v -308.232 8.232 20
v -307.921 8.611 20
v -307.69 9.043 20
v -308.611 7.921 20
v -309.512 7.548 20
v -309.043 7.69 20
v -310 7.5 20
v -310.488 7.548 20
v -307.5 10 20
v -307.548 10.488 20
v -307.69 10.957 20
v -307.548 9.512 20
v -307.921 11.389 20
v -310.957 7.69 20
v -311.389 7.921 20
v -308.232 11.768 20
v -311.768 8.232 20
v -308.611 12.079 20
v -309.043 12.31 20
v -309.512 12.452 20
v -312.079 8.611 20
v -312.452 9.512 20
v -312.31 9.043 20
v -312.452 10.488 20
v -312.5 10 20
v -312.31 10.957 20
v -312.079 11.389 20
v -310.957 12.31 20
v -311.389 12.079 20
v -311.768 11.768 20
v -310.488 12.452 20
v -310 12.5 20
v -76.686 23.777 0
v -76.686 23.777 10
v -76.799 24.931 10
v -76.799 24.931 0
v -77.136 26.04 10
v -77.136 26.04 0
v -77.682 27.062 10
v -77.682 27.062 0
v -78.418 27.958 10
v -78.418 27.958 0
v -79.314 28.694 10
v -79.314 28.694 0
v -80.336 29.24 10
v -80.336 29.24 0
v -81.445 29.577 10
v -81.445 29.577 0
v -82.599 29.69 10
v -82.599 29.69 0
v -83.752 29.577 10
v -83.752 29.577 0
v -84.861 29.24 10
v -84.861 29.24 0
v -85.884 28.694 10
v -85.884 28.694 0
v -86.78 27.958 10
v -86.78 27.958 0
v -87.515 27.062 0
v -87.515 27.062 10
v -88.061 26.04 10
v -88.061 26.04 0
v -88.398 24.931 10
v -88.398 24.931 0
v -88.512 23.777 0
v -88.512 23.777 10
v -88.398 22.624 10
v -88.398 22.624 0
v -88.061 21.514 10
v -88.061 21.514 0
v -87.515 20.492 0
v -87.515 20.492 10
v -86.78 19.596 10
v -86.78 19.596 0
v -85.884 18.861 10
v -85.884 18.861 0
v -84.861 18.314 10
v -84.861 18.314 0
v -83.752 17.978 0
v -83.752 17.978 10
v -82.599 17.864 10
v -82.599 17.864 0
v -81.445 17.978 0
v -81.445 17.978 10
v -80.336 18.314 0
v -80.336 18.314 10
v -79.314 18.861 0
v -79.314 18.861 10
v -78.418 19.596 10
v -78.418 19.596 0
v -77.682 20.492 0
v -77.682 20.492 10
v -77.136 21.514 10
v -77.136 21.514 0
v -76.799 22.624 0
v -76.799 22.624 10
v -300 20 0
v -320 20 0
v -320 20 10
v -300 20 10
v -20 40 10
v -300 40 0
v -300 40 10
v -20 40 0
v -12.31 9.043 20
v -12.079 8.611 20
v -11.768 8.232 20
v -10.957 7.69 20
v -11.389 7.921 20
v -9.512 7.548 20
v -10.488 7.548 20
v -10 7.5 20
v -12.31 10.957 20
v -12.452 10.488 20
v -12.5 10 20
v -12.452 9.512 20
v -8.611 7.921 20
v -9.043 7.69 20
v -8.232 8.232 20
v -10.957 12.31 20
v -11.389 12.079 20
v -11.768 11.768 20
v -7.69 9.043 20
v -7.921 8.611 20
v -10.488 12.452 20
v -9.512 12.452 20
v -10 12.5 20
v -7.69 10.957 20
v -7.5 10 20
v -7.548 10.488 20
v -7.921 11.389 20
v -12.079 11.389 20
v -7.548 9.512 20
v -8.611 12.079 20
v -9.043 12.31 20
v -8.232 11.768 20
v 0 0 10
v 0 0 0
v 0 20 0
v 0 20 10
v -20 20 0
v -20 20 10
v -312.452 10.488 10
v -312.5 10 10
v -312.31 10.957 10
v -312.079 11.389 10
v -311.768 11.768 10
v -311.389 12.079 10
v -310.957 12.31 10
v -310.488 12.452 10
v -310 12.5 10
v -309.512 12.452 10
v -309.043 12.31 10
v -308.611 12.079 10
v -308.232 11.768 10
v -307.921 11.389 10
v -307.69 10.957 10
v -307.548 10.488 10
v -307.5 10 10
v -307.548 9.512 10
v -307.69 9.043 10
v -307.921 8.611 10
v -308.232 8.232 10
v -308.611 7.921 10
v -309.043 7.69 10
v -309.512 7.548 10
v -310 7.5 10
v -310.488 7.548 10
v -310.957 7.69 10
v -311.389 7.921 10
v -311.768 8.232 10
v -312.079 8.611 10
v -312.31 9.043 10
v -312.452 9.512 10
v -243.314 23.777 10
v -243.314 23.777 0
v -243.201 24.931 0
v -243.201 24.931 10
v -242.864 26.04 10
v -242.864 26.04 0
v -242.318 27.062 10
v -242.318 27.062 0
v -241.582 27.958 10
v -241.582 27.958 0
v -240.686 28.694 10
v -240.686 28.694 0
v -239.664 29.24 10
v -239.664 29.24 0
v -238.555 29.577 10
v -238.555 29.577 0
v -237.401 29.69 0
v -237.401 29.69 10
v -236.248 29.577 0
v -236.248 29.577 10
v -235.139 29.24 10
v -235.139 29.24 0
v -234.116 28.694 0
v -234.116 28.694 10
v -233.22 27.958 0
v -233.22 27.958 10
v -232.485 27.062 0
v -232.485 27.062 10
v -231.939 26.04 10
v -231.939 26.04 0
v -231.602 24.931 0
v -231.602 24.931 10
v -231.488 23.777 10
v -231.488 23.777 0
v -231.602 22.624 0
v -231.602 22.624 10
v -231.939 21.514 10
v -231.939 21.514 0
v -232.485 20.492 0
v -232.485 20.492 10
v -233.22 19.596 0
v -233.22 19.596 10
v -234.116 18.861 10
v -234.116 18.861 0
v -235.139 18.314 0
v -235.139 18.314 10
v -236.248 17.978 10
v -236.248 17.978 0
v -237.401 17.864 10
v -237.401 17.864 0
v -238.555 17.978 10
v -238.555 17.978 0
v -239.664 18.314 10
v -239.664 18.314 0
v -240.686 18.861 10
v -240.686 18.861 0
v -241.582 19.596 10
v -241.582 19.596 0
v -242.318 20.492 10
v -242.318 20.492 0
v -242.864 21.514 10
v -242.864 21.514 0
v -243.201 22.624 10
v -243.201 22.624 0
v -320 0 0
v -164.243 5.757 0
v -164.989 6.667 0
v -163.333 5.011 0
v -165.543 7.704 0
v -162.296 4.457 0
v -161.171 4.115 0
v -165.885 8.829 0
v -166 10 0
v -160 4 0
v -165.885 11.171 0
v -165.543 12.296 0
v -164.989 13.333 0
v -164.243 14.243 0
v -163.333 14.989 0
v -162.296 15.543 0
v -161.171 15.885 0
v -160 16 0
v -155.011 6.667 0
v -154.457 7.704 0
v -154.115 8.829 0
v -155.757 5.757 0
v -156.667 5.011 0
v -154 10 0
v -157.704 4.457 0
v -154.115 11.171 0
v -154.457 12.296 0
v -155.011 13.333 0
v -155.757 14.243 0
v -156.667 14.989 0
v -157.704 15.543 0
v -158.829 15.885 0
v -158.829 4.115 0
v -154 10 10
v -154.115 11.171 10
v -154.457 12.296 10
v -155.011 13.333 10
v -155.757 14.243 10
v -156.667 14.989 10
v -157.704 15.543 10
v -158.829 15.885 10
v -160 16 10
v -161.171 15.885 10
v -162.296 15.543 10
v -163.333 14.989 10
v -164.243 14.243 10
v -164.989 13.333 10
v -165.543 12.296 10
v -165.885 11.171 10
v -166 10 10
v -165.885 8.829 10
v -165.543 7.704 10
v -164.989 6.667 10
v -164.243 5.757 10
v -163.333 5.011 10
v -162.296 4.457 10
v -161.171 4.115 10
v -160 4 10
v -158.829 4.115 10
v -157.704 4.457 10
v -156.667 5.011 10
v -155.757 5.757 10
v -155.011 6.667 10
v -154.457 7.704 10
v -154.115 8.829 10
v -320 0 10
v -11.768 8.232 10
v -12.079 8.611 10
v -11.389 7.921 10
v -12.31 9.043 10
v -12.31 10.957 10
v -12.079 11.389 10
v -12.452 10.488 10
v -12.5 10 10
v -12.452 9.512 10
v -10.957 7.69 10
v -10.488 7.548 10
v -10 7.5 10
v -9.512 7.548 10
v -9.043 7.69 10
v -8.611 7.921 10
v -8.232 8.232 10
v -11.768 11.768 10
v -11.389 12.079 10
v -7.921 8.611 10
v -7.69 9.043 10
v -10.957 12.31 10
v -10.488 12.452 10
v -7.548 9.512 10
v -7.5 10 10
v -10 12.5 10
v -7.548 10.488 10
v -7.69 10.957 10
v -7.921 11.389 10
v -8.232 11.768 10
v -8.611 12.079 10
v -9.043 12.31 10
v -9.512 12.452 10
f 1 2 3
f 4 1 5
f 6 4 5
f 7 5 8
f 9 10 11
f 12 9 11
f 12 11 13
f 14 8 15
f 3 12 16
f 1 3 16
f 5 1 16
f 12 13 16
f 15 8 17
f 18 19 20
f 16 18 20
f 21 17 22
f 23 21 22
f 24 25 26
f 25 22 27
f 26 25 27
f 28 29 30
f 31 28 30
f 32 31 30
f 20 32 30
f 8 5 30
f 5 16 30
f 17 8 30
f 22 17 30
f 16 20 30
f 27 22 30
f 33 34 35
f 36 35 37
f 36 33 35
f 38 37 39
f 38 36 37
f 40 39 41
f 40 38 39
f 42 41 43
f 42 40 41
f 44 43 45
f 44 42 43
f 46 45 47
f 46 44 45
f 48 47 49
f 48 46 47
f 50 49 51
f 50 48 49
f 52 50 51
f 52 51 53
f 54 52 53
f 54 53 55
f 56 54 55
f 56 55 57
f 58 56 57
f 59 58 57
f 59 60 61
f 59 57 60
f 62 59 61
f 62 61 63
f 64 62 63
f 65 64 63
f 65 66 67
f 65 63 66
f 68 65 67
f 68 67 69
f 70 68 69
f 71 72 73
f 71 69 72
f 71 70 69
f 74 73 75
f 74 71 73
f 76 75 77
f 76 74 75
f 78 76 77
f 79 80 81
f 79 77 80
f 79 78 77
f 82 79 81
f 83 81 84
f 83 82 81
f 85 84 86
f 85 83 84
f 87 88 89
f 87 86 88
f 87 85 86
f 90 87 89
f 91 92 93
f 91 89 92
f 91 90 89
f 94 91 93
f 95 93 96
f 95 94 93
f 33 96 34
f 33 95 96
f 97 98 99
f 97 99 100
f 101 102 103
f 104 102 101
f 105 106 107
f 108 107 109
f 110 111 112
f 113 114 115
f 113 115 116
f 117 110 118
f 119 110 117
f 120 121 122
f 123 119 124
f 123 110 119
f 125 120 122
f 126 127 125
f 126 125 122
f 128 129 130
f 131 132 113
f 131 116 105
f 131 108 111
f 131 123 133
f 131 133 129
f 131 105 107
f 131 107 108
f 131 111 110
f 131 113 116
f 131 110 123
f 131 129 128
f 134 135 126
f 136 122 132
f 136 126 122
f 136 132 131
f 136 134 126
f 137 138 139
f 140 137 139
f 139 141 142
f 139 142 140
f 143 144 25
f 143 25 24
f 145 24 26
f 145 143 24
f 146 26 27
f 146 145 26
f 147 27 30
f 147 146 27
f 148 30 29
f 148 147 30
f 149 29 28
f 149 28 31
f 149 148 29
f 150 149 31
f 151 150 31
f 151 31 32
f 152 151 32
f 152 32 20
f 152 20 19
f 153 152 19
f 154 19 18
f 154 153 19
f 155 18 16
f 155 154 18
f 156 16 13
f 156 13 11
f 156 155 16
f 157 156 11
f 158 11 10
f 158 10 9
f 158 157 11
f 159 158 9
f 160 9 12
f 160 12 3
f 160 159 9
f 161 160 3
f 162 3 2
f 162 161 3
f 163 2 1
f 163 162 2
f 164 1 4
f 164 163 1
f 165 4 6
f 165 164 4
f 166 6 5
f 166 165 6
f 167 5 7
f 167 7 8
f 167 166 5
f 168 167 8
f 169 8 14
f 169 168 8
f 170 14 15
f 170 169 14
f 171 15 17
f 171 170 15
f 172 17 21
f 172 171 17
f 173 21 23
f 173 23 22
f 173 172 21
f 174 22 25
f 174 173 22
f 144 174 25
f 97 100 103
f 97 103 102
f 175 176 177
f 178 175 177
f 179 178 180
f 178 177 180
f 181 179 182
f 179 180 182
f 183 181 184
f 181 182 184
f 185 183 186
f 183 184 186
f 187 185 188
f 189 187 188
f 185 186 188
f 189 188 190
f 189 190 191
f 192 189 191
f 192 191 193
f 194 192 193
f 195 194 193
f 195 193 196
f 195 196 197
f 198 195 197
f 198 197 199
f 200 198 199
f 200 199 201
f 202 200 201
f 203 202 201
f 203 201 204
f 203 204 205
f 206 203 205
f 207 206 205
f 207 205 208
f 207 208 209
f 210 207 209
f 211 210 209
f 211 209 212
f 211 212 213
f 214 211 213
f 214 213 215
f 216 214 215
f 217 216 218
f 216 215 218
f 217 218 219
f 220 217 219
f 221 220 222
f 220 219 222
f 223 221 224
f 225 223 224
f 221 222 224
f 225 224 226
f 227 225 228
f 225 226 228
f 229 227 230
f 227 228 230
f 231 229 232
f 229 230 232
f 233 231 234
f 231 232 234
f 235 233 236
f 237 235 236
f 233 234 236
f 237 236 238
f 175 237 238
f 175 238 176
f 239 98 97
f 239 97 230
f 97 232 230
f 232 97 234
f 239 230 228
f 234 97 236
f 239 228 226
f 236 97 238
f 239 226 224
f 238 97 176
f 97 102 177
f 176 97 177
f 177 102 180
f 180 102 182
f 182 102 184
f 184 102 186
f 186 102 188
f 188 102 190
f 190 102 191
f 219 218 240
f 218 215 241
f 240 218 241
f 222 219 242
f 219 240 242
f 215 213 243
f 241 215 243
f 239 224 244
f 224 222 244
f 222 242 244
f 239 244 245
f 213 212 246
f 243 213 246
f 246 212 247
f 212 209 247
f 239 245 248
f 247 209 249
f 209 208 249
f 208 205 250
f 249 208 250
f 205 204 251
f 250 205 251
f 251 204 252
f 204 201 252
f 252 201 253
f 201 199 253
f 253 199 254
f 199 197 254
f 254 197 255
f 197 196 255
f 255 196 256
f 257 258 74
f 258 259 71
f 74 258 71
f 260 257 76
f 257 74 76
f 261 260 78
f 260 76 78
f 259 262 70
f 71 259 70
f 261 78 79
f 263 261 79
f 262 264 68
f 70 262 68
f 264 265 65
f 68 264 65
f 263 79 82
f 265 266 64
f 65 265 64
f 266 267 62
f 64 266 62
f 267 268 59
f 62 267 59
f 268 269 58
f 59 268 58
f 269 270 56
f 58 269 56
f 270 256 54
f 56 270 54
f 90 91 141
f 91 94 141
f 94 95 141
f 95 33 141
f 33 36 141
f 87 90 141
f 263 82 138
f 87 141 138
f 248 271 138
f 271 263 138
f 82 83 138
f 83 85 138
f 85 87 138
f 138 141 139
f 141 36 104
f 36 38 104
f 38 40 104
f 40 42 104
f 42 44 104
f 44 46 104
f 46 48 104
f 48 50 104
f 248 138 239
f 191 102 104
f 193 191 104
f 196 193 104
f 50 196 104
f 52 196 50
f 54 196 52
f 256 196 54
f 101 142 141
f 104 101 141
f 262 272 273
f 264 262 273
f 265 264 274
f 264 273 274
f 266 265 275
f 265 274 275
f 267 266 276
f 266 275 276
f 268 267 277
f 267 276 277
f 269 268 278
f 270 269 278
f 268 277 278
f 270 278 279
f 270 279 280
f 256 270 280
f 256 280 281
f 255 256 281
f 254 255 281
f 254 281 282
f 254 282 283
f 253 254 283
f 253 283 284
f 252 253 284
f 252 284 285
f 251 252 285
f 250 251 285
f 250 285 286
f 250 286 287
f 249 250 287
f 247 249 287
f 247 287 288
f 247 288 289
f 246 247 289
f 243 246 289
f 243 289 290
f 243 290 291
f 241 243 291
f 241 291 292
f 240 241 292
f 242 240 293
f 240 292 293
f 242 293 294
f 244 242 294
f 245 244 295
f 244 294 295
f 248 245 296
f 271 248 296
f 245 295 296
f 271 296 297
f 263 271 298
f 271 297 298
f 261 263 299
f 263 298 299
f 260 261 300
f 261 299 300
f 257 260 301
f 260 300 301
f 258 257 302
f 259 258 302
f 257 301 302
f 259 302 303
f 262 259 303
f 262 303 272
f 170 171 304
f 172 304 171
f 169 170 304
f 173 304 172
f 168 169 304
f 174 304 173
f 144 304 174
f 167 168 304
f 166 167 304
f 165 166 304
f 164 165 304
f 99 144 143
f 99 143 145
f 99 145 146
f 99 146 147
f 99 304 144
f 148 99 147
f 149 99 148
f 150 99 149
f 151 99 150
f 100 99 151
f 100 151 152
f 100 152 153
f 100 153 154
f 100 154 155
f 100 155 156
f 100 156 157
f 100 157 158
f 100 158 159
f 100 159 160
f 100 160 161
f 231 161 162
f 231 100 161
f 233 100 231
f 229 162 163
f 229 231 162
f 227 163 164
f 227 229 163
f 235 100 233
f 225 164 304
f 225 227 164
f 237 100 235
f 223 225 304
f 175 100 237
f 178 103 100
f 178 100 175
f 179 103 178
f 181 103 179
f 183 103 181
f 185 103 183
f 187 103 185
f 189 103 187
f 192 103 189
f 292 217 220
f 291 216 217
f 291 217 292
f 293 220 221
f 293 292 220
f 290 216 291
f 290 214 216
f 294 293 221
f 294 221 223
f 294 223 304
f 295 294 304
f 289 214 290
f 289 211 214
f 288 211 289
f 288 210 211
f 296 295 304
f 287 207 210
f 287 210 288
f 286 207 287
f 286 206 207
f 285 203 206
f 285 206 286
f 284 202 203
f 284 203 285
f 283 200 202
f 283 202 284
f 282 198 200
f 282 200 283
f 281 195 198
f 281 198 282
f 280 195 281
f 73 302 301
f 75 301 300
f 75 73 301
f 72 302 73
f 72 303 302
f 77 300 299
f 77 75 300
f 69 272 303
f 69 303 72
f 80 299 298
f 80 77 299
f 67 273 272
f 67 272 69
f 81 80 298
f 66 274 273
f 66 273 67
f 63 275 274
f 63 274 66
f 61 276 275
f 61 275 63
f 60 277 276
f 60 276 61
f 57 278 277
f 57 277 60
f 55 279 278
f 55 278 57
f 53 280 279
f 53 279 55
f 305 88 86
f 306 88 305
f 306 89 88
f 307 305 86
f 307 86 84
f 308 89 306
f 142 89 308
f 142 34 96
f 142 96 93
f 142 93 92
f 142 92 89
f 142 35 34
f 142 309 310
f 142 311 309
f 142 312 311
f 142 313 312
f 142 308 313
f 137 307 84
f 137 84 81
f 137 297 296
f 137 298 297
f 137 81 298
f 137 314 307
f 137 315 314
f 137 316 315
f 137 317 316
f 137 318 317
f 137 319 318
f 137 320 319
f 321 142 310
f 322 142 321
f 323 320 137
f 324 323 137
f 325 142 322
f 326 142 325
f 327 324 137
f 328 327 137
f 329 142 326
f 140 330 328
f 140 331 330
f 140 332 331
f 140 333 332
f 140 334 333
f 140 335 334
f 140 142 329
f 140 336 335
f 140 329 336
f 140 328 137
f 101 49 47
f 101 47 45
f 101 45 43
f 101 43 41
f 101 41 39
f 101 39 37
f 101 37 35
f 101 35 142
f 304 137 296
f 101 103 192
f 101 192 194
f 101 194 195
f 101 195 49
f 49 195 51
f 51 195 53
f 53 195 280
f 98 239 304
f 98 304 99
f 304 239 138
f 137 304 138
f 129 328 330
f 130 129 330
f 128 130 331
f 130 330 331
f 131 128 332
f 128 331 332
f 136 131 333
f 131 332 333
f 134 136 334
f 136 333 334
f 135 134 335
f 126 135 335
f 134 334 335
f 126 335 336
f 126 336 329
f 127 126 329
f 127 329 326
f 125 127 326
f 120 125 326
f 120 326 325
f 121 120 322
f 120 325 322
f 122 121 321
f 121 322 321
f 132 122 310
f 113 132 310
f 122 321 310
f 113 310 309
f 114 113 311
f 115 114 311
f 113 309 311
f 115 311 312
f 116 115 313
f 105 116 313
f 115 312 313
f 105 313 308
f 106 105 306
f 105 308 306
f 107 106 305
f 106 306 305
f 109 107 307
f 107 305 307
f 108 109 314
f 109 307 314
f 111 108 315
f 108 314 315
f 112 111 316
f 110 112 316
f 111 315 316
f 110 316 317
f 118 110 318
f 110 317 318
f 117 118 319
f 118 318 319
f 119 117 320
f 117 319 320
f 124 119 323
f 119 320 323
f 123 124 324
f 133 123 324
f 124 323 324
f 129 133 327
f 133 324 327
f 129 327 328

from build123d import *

# Parameters (mm, degrees)
SKETCH1_W           = 320
SKETCH1_H           = 20
BOSS_EXTRUDE1_DEPTH = 10
SKETCH2_R           = 2.5
BOSS_EXTRUDE2_DEPTH = 10
SKETCH4_R           = 6
CUT_EXTRUDE1_DEPTH  = 60
SKETCH5_W           = 280
SKETCH5_H           = 10
BOSS_EXTRUDE3_DEPTH = 20
SKETCH6_R           = 5.912914271
CUT_EXTRUDE2_DEPTH  = 20


with BuildPart() as part:
    # Sketch1 → Boss-Extrude1 (new body)
    with BuildSketch(Plane.XY):
        with Locations((-160, 10)):
            Rectangle(SKETCH1_W, SKETCH1_H)
    extrude(amount=BOSS_EXTRUDE1_DEPTH)

    # Sketch2 → Boss-Extrude2 (add)
    with BuildSketch(Plane.XY.offset(10)):
        with Locations((-10, 10)):
            Circle(SKETCH2_R)
    boss_extrude2 = extrude(amount=BOSS_EXTRUDE2_DEPTH)

    # Mirror1: Boss-Extrude2 across plane
    add(boss_extrude2.mirror(Plane(origin=(-160, 0, 0), x_dir=(0, 0, 1), z_dir=(1, 0, 0))))

    # Sketch4 → Cut-Extrude1 (cut)
    with BuildSketch(Plane.XY.offset(10)):
        with Locations((-160, 10)):
            Circle(SKETCH4_R)
    extrude(amount=-CUT_EXTRUDE1_DEPTH, mode=Mode.SUBTRACT)

    # Sketch5 → Boss-Extrude3 (add)
    with BuildSketch(Plane(origin=(0, 20, 0), x_dir=(1, 0, 0), z_dir=(0, 1, 0))):
        with Locations((-160, -5)):
            Rectangle(SKETCH5_W, SKETCH5_H)
    extrude(amount=BOSS_EXTRUDE3_DEPTH)

    # Sketch6 → Cut-Extrude2 (cut)
    with BuildSketch(Plane(origin=(0, 0, 0), x_dir=(-1, 0, 0), z_dir=(0, 0, -1))):
        with Locations((237.401391361, 23.777250692)):
            Circle(SKETCH6_R)
    cut_extrude2 = extrude(amount=-CUT_EXTRUDE2_DEPTH, mode=Mode.SUBTRACT)

    # Mirror2: Cut-Extrude2 across plane
    add(cut_extrude2.mirror(Plane(origin=(-160, 0, 0), x_dir=(0, 0, 1), z_dir=(1, 0, 0))), mode=Mode.SUBTRACT)


solid = part.part
